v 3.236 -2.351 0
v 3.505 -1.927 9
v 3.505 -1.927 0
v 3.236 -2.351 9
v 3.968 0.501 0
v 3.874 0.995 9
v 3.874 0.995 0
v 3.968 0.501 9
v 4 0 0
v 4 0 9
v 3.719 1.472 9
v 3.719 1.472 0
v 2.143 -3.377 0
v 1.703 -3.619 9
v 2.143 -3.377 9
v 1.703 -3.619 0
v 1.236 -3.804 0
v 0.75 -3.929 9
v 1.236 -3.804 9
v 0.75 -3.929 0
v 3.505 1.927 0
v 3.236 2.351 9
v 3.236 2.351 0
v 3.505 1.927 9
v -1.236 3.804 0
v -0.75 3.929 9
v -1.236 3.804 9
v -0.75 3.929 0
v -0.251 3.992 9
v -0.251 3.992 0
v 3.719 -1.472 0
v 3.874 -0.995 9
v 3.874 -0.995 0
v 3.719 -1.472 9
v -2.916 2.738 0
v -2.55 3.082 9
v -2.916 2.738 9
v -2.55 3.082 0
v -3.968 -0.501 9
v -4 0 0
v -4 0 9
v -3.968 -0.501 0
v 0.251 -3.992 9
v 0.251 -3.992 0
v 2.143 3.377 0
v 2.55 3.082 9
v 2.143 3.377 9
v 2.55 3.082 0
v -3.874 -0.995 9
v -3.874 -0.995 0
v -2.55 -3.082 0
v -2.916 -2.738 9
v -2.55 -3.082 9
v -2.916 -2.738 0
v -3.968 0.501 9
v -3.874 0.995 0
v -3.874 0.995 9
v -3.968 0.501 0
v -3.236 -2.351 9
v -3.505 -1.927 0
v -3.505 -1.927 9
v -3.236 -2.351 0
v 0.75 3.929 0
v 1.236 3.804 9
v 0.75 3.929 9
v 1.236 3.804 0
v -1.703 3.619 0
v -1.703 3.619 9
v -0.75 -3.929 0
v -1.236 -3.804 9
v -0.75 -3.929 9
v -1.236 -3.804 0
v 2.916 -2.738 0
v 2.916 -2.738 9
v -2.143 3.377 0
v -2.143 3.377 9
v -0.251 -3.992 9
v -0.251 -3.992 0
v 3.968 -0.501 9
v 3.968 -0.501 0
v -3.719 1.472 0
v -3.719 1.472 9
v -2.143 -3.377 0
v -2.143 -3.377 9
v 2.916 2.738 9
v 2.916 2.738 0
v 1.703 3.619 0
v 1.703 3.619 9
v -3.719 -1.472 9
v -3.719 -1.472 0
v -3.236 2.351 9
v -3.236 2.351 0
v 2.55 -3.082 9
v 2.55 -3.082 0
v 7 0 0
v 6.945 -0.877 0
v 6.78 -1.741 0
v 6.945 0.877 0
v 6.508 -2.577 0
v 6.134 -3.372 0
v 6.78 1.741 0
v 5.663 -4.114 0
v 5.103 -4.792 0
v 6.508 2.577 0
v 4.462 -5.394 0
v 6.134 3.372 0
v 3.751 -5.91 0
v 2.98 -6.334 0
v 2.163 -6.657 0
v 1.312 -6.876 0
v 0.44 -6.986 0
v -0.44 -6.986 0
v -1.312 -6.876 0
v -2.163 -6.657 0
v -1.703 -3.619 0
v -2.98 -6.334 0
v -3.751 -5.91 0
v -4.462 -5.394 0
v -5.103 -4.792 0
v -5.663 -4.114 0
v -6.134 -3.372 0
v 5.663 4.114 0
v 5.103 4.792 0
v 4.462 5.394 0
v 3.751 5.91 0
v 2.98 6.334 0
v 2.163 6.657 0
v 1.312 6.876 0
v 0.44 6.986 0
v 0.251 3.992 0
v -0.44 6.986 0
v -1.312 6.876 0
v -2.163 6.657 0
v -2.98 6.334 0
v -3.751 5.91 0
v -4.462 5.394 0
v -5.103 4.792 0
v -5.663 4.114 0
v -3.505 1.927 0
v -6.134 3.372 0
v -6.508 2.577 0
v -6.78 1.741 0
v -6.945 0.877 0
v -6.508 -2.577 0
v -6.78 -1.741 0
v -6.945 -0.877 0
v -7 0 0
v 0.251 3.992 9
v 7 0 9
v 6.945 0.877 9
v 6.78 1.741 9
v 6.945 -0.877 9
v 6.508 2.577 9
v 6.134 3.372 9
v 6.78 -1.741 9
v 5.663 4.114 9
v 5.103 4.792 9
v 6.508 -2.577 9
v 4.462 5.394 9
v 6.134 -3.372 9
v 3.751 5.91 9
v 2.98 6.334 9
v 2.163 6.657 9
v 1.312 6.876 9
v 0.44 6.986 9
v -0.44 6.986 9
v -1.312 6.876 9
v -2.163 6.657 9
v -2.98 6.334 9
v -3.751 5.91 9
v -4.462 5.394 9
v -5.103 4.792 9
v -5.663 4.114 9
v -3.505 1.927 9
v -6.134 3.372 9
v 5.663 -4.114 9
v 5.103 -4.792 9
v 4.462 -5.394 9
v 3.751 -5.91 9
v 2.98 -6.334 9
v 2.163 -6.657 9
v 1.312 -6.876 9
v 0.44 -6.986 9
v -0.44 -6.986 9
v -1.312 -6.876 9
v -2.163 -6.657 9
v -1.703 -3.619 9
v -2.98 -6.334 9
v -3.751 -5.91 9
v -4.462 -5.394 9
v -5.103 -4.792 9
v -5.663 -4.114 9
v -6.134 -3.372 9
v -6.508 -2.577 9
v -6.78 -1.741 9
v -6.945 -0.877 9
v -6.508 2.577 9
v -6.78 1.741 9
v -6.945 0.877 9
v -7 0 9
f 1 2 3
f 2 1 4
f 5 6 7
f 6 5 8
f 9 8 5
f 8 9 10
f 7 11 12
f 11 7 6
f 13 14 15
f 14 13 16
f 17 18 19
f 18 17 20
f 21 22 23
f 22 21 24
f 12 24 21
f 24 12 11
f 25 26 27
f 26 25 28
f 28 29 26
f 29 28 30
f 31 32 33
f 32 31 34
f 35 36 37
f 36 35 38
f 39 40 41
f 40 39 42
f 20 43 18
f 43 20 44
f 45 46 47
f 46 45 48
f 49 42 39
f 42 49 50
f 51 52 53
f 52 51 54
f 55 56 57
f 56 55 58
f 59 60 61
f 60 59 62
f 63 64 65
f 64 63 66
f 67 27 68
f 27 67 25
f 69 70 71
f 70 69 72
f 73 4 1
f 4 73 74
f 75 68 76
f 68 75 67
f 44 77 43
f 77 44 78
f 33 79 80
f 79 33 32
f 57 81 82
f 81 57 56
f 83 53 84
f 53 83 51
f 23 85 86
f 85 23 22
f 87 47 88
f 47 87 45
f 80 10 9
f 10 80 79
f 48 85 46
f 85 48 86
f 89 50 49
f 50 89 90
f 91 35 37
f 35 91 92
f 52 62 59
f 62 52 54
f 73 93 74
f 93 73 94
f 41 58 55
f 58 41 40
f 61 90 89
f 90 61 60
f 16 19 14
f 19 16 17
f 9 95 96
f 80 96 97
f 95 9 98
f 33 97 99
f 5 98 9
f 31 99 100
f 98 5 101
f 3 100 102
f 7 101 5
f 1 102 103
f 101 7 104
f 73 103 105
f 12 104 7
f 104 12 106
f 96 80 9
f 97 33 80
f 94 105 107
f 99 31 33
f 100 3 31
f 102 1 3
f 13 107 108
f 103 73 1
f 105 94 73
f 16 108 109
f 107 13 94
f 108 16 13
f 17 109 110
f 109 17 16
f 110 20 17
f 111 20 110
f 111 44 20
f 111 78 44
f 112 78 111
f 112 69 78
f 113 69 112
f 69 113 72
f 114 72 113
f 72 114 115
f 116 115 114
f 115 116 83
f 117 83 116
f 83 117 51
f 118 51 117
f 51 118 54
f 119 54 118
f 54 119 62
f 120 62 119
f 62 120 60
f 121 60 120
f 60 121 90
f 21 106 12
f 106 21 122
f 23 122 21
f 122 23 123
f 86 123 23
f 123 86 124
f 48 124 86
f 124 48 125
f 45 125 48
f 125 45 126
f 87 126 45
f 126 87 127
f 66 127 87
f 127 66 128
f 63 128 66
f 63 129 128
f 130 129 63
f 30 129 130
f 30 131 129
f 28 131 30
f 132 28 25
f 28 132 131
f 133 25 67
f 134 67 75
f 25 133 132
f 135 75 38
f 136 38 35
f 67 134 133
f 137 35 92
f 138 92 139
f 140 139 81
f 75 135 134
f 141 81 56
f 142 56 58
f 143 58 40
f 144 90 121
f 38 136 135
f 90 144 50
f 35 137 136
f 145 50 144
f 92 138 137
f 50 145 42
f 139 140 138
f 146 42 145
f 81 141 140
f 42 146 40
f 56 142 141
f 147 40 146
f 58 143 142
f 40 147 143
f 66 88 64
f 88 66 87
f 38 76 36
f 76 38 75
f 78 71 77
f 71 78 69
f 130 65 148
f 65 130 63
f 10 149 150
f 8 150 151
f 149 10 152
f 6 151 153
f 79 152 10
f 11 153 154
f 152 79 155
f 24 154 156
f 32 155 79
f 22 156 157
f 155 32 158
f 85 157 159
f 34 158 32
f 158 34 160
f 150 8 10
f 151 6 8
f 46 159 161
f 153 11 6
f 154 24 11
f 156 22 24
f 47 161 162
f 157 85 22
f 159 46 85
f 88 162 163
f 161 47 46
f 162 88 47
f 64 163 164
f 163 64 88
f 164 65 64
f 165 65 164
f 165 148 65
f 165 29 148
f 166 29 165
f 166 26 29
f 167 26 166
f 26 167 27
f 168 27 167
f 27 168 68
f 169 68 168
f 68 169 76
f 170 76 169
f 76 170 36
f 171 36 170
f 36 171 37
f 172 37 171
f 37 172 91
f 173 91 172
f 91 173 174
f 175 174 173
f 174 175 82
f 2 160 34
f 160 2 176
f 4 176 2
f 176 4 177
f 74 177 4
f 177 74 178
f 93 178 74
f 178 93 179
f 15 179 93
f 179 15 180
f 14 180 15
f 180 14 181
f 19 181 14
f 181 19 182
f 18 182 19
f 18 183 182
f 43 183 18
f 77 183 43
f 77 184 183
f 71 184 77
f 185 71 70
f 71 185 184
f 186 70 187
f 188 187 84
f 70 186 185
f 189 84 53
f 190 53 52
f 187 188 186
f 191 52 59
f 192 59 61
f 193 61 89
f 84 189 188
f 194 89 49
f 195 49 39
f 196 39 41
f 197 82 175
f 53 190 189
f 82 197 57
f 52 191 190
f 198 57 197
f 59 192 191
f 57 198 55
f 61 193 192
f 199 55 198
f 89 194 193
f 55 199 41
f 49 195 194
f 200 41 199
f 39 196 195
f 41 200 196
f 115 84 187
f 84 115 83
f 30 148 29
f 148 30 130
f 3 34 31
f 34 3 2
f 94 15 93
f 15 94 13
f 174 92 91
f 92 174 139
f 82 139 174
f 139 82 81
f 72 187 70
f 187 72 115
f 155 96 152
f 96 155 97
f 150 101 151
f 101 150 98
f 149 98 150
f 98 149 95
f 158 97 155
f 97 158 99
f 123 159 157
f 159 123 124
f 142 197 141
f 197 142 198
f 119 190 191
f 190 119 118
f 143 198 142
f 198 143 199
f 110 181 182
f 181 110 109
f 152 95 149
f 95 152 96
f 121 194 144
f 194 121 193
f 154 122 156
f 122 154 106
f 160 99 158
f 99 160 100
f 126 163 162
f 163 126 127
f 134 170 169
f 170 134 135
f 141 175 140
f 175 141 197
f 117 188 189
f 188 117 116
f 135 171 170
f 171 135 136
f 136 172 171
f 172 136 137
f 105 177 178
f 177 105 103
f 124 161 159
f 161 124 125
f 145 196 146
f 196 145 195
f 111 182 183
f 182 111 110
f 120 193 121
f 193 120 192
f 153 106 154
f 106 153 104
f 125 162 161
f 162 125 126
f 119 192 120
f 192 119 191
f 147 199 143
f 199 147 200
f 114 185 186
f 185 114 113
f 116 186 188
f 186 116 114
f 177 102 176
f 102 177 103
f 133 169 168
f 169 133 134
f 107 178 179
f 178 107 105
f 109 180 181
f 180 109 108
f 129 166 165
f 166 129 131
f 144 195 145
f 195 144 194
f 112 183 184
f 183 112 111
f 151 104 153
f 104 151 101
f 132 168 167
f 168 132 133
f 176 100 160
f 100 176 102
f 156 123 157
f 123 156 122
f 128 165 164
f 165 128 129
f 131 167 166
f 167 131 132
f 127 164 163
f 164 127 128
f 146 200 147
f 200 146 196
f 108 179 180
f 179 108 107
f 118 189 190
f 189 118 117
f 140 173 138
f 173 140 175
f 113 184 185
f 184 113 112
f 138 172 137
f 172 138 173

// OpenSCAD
$fn = 50;

difference() {
	union() {
		cylinder(h = 9, r = 7.0);
	}
	union() {
		translate(v = [0.0, 0.0, -100.0]) {
			cylinder(h = 200, r = 3.25);
		}
		translate(v = [0.0, 0.0, -100.0]) {
			cylinder(h = 200, r = 1.8);
		}
		cylinder(h = 9, r = 4.0);
	}
}
